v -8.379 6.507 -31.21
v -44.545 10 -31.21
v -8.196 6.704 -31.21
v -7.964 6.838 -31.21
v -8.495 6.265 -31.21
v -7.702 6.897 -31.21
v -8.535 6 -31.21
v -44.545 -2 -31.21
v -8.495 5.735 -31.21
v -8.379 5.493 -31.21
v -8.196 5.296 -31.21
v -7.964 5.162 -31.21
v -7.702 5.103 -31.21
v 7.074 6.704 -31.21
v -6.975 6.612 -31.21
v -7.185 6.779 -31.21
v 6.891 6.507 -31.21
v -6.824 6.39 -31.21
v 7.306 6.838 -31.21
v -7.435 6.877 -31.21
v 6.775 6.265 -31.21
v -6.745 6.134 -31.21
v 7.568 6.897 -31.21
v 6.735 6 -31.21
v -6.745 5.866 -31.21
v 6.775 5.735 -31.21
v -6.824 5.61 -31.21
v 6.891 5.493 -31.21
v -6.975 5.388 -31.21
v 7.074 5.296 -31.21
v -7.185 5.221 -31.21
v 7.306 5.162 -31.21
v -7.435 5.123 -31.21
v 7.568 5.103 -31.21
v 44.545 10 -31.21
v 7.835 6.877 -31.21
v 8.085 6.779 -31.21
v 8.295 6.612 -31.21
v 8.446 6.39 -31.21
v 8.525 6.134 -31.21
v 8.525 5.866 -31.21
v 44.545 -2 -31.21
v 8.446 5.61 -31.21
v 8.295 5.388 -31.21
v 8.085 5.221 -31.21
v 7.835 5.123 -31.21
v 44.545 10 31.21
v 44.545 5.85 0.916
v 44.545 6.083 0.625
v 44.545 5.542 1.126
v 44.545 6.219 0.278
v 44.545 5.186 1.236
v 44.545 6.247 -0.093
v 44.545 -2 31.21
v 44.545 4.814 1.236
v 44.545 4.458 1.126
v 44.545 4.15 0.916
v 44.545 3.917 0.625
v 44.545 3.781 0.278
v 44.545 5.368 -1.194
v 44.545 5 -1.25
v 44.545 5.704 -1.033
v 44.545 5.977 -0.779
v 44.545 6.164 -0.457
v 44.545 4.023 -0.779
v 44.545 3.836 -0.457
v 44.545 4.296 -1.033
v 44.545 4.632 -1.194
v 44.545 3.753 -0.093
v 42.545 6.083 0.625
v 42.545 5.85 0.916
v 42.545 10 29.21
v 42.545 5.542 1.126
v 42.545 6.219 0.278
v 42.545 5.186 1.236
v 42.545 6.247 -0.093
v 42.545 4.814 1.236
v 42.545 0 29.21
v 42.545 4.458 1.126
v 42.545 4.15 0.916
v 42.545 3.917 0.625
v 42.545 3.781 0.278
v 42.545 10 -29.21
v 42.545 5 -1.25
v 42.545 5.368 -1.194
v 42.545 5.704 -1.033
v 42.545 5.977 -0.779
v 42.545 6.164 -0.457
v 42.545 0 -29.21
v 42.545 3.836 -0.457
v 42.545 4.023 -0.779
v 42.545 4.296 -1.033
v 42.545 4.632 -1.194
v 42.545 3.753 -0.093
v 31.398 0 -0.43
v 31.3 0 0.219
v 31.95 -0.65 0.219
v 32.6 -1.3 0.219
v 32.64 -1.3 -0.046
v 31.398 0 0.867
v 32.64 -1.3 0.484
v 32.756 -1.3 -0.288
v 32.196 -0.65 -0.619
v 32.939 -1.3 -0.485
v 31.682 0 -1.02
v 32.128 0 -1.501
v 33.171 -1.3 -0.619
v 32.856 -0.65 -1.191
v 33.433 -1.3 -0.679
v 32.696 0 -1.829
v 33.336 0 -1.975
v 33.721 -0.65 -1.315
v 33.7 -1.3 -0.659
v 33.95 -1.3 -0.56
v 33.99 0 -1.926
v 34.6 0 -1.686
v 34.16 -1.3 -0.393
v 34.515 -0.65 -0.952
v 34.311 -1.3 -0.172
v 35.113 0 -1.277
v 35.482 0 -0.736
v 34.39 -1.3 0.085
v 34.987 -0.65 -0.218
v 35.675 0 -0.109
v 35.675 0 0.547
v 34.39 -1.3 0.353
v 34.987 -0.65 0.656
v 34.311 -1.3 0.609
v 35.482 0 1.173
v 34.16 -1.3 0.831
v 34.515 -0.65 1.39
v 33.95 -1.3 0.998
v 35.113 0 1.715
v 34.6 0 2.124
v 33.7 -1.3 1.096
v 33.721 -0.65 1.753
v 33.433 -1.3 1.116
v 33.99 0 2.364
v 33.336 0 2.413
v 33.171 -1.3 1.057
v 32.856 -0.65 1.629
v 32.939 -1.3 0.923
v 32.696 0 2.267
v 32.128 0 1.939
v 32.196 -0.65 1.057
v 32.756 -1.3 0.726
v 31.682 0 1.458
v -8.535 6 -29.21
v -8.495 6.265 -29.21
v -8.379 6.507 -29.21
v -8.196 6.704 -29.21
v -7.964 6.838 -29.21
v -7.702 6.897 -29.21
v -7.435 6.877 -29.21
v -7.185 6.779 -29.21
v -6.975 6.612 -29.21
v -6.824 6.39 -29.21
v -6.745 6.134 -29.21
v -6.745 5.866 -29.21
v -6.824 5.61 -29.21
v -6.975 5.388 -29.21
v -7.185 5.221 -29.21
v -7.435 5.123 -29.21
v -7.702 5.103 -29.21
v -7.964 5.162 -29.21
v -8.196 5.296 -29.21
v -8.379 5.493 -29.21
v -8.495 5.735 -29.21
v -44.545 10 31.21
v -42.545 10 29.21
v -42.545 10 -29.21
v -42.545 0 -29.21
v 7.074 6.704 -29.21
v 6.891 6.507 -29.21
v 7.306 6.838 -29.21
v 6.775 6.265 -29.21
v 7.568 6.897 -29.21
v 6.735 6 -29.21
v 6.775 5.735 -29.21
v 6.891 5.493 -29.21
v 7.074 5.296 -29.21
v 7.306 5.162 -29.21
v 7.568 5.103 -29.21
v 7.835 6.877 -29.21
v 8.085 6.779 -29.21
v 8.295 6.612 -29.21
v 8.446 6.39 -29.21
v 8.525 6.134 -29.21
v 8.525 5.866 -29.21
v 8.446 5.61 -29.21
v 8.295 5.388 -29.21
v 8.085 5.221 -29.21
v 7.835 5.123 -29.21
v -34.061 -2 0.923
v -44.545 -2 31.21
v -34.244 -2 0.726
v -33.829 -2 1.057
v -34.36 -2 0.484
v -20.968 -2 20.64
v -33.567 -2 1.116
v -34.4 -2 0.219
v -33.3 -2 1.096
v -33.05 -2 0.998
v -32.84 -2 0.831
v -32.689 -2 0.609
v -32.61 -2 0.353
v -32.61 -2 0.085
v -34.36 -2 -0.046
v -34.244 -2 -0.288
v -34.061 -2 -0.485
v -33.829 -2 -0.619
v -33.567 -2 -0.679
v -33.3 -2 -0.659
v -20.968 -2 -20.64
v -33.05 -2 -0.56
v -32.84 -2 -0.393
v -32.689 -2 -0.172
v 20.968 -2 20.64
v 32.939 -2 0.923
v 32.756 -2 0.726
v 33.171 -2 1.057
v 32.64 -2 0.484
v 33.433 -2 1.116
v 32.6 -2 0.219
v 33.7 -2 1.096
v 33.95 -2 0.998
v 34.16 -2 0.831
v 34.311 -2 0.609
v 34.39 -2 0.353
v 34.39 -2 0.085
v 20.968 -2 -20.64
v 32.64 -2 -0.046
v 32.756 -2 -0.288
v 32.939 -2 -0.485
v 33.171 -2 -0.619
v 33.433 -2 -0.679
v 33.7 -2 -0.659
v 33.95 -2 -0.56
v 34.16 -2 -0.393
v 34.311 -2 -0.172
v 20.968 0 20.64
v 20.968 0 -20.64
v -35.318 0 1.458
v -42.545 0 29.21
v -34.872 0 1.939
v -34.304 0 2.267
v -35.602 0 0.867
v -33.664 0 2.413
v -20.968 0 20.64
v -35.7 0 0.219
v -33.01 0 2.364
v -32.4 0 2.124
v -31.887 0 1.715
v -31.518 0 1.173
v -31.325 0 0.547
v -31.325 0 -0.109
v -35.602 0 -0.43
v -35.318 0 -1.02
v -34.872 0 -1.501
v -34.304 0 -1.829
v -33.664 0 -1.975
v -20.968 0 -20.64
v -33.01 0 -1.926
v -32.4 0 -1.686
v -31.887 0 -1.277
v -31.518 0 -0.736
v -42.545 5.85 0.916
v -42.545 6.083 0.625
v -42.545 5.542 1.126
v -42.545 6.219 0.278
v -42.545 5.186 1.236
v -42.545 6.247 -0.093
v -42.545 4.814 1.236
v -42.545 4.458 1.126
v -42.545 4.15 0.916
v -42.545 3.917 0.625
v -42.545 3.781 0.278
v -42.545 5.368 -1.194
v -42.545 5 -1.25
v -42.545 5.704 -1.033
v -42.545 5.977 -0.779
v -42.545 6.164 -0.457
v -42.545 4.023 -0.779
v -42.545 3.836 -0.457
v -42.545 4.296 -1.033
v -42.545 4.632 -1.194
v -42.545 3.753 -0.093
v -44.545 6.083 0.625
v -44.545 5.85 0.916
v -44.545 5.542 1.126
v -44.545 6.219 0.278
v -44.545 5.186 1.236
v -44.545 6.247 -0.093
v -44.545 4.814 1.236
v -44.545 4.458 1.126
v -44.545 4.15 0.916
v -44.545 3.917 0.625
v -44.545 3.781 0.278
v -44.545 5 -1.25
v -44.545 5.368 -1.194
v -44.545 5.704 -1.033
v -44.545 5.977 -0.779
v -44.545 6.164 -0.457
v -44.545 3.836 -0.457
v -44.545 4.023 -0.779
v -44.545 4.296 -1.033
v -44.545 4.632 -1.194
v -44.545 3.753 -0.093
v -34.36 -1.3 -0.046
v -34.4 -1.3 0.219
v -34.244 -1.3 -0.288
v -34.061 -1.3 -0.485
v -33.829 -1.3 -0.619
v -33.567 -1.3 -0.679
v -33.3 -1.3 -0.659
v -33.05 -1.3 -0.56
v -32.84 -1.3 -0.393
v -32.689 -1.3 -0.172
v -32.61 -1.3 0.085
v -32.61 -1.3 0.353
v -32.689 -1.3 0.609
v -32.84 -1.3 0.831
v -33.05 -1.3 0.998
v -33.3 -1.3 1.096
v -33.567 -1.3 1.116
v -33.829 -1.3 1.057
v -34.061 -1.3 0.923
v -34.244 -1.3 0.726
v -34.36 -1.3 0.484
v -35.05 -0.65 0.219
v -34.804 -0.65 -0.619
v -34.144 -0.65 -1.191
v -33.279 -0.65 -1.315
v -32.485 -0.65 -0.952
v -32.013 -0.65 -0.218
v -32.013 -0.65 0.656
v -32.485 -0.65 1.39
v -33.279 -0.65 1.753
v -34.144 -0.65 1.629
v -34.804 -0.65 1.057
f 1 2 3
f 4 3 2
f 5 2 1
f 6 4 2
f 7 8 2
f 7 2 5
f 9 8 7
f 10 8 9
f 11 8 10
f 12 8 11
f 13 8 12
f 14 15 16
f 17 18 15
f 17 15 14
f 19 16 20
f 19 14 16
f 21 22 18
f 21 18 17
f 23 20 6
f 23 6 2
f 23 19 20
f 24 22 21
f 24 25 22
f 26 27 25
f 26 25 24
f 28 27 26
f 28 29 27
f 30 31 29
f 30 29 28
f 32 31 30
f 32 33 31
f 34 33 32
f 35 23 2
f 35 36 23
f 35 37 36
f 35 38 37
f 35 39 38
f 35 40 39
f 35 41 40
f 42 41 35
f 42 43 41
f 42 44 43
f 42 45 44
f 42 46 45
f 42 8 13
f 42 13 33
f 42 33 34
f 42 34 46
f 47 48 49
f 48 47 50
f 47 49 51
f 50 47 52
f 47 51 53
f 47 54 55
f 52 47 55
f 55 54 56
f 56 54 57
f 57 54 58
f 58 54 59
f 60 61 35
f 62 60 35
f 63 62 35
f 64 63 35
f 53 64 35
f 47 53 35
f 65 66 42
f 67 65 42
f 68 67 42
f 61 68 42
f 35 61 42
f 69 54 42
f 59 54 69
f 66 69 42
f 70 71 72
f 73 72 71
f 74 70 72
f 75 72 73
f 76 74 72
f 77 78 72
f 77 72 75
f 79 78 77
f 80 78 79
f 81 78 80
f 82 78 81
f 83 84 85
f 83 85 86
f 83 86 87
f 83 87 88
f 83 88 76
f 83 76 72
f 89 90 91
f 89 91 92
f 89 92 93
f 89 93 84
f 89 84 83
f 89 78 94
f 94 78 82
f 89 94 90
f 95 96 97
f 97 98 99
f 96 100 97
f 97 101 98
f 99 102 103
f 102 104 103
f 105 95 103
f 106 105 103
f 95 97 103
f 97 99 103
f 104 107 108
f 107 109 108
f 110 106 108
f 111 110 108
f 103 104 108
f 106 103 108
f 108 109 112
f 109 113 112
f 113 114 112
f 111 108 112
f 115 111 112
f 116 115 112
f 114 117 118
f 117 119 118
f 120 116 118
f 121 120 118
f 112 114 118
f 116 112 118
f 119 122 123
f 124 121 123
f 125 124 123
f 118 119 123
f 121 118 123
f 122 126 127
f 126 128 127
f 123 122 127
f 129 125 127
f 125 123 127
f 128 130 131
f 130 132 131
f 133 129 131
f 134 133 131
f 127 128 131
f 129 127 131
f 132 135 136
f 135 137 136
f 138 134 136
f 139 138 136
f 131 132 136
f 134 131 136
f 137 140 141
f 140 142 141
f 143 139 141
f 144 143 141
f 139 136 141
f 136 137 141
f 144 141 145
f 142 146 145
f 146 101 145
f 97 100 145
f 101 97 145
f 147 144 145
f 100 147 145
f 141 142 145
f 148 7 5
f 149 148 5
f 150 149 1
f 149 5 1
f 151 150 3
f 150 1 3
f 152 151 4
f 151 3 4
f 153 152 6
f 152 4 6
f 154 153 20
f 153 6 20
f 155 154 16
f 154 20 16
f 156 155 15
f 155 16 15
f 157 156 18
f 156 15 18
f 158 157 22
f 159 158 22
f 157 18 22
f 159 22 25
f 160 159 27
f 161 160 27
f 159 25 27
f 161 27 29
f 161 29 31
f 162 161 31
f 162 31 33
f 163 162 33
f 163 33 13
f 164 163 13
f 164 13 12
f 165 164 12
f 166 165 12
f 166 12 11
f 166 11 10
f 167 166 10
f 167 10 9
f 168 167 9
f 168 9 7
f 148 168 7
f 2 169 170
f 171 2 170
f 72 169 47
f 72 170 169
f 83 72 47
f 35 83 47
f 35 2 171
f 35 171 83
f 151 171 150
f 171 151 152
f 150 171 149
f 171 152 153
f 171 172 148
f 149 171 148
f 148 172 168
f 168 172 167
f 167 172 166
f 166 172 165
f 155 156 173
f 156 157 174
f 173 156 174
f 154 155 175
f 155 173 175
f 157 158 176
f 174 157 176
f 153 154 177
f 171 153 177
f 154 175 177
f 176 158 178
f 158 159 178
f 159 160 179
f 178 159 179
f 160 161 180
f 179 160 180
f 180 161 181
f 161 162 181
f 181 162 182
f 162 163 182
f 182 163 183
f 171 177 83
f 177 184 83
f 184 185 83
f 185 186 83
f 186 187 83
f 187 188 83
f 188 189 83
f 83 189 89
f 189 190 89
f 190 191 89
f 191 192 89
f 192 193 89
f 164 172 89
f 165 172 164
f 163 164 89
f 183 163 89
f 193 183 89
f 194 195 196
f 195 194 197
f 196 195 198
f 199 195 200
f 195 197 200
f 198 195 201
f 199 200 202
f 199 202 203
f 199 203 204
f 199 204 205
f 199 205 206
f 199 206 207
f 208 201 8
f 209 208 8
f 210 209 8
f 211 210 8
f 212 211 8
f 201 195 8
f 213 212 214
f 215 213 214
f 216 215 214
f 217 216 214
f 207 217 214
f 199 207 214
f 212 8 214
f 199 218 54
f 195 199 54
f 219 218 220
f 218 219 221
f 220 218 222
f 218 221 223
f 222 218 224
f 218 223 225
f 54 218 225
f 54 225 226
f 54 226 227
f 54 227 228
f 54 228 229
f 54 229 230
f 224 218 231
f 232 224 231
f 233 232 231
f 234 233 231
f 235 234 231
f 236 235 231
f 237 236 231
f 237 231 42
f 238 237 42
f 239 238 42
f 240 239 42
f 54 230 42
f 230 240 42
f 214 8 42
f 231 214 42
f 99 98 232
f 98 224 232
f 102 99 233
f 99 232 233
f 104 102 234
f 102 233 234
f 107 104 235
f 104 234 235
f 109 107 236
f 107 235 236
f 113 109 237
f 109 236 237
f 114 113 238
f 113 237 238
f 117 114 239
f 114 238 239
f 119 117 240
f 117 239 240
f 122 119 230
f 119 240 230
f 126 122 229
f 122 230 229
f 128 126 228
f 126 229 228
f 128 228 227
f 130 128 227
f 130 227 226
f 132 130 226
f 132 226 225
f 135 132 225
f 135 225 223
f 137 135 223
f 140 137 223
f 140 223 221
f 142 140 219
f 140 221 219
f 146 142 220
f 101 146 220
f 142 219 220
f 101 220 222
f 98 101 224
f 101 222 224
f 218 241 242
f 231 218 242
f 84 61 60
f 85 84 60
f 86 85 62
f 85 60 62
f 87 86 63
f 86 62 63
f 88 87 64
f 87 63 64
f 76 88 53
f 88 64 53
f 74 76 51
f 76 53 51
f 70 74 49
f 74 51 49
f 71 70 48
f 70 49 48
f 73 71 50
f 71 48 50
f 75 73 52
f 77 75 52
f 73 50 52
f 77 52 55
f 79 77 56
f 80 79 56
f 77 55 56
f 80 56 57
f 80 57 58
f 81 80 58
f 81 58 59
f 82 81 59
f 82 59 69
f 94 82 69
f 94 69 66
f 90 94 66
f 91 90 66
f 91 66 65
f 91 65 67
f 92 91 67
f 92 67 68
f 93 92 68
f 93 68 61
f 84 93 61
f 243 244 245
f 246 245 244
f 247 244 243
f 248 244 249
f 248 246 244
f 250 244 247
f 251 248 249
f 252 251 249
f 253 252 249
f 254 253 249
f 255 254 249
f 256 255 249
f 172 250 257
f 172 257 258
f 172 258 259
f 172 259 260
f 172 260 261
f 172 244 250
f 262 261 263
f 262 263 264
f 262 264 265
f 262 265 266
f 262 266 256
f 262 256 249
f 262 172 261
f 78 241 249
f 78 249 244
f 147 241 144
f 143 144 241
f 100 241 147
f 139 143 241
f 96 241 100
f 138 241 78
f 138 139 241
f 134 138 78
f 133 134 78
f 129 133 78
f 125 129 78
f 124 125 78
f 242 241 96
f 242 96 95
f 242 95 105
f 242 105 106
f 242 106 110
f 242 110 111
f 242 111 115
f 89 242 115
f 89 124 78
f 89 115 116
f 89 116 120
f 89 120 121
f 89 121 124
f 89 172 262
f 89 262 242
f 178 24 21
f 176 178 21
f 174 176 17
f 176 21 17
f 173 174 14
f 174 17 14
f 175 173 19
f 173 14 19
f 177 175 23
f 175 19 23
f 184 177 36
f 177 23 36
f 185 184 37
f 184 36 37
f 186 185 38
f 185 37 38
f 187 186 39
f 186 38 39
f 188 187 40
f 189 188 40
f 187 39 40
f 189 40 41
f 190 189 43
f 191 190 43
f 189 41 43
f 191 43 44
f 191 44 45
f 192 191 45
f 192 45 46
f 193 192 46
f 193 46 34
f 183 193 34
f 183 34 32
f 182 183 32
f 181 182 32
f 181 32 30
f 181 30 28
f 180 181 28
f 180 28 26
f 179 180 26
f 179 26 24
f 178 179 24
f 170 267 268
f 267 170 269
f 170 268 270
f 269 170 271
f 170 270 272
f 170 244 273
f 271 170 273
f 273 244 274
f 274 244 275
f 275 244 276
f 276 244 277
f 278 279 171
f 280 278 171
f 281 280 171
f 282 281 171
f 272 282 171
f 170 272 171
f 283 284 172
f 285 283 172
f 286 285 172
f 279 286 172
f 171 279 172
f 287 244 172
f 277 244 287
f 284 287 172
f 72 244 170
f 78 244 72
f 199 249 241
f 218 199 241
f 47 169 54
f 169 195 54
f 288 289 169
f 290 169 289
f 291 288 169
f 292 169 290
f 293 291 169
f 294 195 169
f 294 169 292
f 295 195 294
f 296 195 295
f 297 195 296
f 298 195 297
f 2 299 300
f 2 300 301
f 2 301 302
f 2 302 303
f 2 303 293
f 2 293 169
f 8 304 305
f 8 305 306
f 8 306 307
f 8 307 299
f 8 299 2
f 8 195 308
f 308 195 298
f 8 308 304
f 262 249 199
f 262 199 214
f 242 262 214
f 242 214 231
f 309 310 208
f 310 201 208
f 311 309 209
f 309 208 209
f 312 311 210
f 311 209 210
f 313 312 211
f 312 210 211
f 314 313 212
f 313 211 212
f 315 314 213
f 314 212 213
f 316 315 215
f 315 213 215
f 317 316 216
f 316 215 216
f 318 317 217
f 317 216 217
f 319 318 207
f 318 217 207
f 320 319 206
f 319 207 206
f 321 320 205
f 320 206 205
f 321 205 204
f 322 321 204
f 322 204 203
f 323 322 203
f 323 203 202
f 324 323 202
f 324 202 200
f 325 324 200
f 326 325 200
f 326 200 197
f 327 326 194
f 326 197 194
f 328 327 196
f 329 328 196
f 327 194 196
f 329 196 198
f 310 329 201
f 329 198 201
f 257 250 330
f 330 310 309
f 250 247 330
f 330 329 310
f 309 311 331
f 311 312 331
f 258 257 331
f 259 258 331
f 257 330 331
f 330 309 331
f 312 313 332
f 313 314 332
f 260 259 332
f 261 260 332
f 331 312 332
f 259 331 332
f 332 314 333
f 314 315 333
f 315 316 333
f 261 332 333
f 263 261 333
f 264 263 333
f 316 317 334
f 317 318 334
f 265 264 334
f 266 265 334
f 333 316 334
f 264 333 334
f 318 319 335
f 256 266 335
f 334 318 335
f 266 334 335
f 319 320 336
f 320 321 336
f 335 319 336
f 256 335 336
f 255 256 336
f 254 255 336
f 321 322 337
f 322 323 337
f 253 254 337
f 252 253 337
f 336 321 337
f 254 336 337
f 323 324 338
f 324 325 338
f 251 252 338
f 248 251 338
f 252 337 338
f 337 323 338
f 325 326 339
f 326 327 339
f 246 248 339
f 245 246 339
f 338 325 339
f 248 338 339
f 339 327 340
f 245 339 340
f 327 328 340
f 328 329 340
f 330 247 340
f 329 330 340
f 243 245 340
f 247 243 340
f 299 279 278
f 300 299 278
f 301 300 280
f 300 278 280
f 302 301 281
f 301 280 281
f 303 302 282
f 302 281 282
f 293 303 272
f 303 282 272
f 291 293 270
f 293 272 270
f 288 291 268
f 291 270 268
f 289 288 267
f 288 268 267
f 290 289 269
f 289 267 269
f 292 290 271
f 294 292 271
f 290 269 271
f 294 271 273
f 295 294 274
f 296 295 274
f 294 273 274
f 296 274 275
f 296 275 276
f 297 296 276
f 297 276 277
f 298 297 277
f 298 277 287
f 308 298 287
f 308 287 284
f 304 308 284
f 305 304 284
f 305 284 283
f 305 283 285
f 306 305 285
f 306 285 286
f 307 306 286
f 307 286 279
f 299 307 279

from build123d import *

# Parameters (mm, degrees)
SKETCH1_W                                       = 89.09
SKETCH1_H                                       = 62.42
BOSS_EXTRUDE1_DEPTH                             = 2
SKETCH1_3_W                                     = 89.09
SKETCH1_3_H                                     = 62.42
SKETCH1_3_W_2                                   = 85.09
SKETCH1_3_H_2                                   = 58.42
BOSS_EXTRUDE2_DEPTH                             = 10
CSK_FOR_M2_FLAT_HEAD_MACHINE_SCREW1_D           = 1.8
CSK_FOR_M2_FLAT_HEAD_MACHINE_SCREW1_DEPTH       = 9.906
CSK_FOR_M2_FLAT_HEAD_MACHINE_SCREW1_CSINK_D     = 4.4
CSK_FOR_M2_FLAT_HEAD_MACHINE_SCREW1_CSINK_ANGLE = 90
CSK_FOR_M2_FLAT_HEAD_MACHINE_SCREW1_TIP         = 0.540774557
SKETCH7_W                                       = 41.935160688
SKETCH7_H                                       = 41.279429724
CUT_EXTRUDE1_DEPTH                              = 2.54
CUT_EXTRUDE2_REACH                              = 79.334
SKETCH8_R                                       = 0.9
SKETCH9_R                                       = 1.25
CUT_EXTRUDE3_DEPTH                              = 95.92677283


with BuildPart() as part:
    # Sketch1 → Boss-Extrude1 (new body)
    with BuildSketch(Plane(origin=(0, 0, 0), x_dir=(1, 0, 0), z_dir=(0, 1, 0))):
        Rectangle(SKETCH1_W, SKETCH1_H)
    extrude(amount=-BOSS_EXTRUDE1_DEPTH)

    # Sketch1<3> → Boss-Extrude2 (add)
    with BuildSketch(Plane(origin=(0, 0, 0), x_dir=(1, 0, 0), z_dir=(0, 1, 0))):
        Rectangle(SKETCH1_3_W, SKETCH1_3_H)
        Rectangle(SKETCH1_3_W_2, SKETCH1_3_H_2, mode=Mode.SUBTRACT)
    extrude(amount=BOSS_EXTRUDE2_DEPTH)

    # CSK for M2 Flat Head Machine Screw1
    with Locations(Plane(origin=(0, 0, 0), x_dir=(1, 0, 0), z_dir=(0, 1, 0))):
        with Locations((-33.5, -0.21892606), (33.5, -0.21892606)):
            CounterSinkHole(CSK_FOR_M2_FLAT_HEAD_MACHINE_SCREW1_D / 2, CSK_FOR_M2_FLAT_HEAD_MACHINE_SCREW1_CSINK_D / 2, depth=CSK_FOR_M2_FLAT_HEAD_MACHINE_SCREW1_DEPTH, counter_sink_angle=CSK_FOR_M2_FLAT_HEAD_MACHINE_SCREW1_CSINK_ANGLE)
            with Locations((0, 0, -(CSK_FOR_M2_FLAT_HEAD_MACHINE_SCREW1_DEPTH + CSK_FOR_M2_FLAT_HEAD_MACHINE_SCREW1_TIP / 2))):  # 118° drill point
                Cone(0, CSK_FOR_M2_FLAT_HEAD_MACHINE_SCREW1_D / 2, CSK_FOR_M2_FLAT_HEAD_MACHINE_SCREW1_TIP, mode=Mode.SUBTRACT)

    # Sketch7 → Cut-Extrude1 (cut)
    with BuildSketch(Plane(origin=(0, 0, 0), x_dir=(1, 0, 0), z_dir=(0, 1, 0))):
        Rectangle(SKETCH7_W, SKETCH7_H)
    extrude(amount=-CUT_EXTRUDE1_DEPTH, mode=Mode.SUBTRACT)

    # Sketch8 → Cut-Extrude2 (cut, up to next)
    with BuildSketch(Plane(origin=(0, 0, -31.21), x_dir=(-1, 0, 0), z_dir=(0, 0, -1)), mode=Mode.PRIVATE) as cut_extrude2_sk1:
        with Locations((-7.635, 6)):
            Circle(SKETCH8_R)
    cut_extrude2_tool1 = extrude(cut_extrude2_sk1.sketch, amount=-CUT_EXTRUDE2_REACH, mode=Mode.PRIVATE) & part.part
    # Sketch8 → Cut-Extrude2 (cut, up to next)
    with BuildSketch(Plane(origin=(0, 0, -31.21), x_dir=(-1, 0, 0), z_dir=(0, 0, -1)), mode=Mode.PRIVATE) as cut_extrude2_sk2:
        with Locations((7.635, 6)):
            Circle(SKETCH8_R)
    cut_extrude2_tool2 = extrude(cut_extrude2_sk2.sketch, amount=-CUT_EXTRUDE2_REACH, mode=Mode.PRIVATE) & part.part
    add(cut_extrude2_tool1.solids().sort_by_distance((7.635, 6, -31.21))[0], mode=Mode.SUBTRACT)
    add(cut_extrude2_tool2.solids().sort_by_distance((-7.635, 6, -31.21))[0], mode=Mode.SUBTRACT)

    # Sketch9 → Cut-Extrude3 (cut, through all)
    with BuildSketch(Plane(origin=(44.545, 0, 0), x_dir=(0, 0, -1), z_dir=(1, 0, 0))):
        with Locations((0, 5)):
            Circle(SKETCH9_R)
    extrude(amount=-CUT_EXTRUDE3_DEPTH, mode=Mode.SUBTRACT)


solid = part.part
